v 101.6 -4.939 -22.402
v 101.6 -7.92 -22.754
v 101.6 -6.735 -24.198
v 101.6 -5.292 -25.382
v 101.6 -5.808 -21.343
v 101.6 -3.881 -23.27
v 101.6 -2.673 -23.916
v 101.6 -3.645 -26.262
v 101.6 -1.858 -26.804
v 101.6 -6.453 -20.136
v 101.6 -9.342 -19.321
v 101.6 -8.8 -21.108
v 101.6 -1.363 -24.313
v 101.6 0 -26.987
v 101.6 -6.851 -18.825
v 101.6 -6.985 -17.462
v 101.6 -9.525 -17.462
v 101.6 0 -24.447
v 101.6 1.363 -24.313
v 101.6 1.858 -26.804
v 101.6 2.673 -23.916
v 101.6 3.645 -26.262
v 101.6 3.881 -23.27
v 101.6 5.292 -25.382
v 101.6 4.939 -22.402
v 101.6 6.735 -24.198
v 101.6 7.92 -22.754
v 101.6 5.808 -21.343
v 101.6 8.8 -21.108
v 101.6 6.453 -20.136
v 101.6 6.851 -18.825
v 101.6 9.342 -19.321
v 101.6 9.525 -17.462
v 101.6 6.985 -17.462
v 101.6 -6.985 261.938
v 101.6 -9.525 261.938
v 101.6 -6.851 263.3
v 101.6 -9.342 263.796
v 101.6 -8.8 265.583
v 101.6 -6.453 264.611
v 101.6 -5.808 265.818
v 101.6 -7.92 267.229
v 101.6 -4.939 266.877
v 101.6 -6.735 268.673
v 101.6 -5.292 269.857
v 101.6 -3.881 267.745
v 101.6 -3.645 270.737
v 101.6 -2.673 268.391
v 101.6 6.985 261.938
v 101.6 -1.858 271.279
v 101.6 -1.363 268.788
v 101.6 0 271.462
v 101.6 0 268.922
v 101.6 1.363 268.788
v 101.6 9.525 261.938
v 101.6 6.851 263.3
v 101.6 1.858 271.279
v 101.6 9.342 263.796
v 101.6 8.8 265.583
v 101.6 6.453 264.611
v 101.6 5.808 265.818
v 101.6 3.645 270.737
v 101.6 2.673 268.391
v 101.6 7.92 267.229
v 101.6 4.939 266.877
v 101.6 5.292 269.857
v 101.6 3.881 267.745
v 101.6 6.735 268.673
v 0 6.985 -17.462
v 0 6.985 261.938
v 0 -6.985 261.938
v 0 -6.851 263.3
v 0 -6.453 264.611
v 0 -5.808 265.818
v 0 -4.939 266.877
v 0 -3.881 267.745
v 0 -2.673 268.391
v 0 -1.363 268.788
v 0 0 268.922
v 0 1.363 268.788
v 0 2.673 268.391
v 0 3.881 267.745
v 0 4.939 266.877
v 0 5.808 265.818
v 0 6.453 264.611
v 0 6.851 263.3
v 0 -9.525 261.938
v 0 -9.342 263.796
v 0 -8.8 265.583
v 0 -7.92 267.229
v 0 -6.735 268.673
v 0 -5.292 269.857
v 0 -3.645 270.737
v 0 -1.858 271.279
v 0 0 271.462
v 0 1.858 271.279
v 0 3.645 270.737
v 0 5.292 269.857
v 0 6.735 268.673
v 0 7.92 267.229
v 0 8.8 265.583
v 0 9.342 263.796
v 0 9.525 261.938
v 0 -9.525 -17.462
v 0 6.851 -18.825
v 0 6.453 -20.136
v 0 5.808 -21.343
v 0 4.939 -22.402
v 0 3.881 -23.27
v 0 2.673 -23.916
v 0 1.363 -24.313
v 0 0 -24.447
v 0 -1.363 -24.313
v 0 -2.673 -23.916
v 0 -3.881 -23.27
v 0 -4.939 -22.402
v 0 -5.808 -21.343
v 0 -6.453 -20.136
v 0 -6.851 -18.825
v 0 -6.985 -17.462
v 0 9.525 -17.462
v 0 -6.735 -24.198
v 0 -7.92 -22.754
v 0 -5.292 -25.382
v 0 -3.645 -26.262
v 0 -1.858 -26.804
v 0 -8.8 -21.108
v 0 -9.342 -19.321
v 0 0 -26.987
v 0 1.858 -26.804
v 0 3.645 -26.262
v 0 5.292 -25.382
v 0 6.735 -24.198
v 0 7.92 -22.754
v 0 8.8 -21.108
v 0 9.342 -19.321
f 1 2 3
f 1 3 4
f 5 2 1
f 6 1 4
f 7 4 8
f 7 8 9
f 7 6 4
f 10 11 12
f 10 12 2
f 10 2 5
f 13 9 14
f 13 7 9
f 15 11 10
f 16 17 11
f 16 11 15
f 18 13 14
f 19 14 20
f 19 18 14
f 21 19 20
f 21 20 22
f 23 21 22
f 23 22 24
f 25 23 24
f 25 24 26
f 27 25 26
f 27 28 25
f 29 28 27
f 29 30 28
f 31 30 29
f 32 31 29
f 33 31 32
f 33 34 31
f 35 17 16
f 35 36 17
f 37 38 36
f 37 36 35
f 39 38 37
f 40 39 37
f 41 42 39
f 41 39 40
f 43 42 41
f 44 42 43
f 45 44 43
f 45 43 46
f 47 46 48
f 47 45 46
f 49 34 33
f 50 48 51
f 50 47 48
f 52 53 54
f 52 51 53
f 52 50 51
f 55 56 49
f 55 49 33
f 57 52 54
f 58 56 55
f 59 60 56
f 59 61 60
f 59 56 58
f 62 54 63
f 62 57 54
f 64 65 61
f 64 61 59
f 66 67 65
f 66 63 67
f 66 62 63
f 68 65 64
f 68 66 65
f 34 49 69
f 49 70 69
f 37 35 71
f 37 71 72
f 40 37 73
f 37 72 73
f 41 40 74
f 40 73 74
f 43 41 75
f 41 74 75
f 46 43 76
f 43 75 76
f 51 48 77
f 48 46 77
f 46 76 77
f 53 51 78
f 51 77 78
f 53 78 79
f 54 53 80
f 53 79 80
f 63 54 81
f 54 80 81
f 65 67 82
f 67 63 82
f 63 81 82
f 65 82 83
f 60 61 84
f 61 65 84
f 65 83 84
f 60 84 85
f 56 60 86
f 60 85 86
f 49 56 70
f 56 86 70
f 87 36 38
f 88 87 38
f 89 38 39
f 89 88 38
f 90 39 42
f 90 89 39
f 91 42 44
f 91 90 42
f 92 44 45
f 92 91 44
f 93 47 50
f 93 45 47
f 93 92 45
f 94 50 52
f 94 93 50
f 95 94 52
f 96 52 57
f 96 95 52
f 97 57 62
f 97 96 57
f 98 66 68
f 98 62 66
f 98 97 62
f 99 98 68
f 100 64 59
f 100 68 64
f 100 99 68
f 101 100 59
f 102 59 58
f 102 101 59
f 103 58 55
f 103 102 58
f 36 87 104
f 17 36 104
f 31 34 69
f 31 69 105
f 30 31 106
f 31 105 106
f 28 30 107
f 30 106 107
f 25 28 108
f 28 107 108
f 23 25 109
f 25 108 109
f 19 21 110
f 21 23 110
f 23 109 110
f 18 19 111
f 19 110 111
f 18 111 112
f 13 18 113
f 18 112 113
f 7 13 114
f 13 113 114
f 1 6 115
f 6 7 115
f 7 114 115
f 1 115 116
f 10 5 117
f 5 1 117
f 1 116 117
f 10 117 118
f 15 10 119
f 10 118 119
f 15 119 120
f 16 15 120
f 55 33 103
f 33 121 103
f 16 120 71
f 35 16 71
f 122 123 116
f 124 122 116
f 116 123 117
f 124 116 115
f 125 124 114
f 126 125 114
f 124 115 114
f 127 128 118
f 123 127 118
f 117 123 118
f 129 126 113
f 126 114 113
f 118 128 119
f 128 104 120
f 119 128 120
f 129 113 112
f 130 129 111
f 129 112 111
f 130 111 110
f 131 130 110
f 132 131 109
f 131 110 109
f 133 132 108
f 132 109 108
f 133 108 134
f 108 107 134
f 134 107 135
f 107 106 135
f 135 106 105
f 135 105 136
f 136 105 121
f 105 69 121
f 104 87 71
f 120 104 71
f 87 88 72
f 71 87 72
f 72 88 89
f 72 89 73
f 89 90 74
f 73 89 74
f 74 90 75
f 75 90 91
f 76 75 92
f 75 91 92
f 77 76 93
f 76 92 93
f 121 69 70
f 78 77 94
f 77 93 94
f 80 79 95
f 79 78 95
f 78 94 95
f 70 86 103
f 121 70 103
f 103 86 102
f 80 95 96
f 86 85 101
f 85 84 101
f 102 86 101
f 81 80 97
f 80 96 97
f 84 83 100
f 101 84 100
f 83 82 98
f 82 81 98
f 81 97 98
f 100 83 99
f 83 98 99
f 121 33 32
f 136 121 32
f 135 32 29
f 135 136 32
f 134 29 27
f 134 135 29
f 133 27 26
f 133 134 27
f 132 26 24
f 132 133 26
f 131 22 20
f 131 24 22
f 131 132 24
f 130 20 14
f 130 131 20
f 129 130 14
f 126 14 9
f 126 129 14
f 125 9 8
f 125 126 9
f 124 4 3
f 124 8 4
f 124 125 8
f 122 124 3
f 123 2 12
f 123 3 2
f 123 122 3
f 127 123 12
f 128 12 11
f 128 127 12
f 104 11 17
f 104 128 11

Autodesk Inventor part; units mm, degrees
ref_plane "YZ Plane" through (0, 0, 0) normal (1, 0, 0) x (0, 1, 0)
ref_plane "XZ Plane" through (0, 0, 0) normal (0, 1, 0) x (-1, 0, 0)
ref_plane "XY Plane" through (0, 0, 0) normal (0, 0, 1) x (1, 0, 0)
sketch "Sketch1" plane through (0, 0, 0) normal (1, 0, 0) x (0, 1, 0)
  arc A0 (-9.525, -17.4625) -> (9.525, -17.4625) centre (0, -17.4625) ccw
  line L0 (9.525, -17.4625) -> (9.525, 261.9375)
  arc A1 (9.525, 261.9375) -> (-9.525, 261.9375) centre (0, 261.9375) ccw
  line L1 (-9.525, 261.9375) -> (-9.525, -17.4625)
  arc A2 (-6.985, -17.4625) -> (6.985, -17.4625) centre (0, -17.4625) ccw
  arc A3 (6.985, 261.9375) -> (-6.985, 261.9375) centre (0, 261.9375) ccw
  line L2 (6.985, 261.9375) -> (6.985, -17.4625)
  line L3 (-6.985, -17.4625) -> (-6.985, 261.9375)
  point P0 (0, 0)
  dimension "d0" = 9.525
  dimension "d1" = 279.4
  dimension "d2" = 6.985
  dimension "d3" = 6.985
extrude "Extrusion1" add sketch "Sketch1" along normal blind 101.6
sketch "Sketch2" plane through (101.6, 0, 0) normal (1, 0, 0) x (0, 0, -1)
  point P0 (0, 0)
properties part number "BELT"
